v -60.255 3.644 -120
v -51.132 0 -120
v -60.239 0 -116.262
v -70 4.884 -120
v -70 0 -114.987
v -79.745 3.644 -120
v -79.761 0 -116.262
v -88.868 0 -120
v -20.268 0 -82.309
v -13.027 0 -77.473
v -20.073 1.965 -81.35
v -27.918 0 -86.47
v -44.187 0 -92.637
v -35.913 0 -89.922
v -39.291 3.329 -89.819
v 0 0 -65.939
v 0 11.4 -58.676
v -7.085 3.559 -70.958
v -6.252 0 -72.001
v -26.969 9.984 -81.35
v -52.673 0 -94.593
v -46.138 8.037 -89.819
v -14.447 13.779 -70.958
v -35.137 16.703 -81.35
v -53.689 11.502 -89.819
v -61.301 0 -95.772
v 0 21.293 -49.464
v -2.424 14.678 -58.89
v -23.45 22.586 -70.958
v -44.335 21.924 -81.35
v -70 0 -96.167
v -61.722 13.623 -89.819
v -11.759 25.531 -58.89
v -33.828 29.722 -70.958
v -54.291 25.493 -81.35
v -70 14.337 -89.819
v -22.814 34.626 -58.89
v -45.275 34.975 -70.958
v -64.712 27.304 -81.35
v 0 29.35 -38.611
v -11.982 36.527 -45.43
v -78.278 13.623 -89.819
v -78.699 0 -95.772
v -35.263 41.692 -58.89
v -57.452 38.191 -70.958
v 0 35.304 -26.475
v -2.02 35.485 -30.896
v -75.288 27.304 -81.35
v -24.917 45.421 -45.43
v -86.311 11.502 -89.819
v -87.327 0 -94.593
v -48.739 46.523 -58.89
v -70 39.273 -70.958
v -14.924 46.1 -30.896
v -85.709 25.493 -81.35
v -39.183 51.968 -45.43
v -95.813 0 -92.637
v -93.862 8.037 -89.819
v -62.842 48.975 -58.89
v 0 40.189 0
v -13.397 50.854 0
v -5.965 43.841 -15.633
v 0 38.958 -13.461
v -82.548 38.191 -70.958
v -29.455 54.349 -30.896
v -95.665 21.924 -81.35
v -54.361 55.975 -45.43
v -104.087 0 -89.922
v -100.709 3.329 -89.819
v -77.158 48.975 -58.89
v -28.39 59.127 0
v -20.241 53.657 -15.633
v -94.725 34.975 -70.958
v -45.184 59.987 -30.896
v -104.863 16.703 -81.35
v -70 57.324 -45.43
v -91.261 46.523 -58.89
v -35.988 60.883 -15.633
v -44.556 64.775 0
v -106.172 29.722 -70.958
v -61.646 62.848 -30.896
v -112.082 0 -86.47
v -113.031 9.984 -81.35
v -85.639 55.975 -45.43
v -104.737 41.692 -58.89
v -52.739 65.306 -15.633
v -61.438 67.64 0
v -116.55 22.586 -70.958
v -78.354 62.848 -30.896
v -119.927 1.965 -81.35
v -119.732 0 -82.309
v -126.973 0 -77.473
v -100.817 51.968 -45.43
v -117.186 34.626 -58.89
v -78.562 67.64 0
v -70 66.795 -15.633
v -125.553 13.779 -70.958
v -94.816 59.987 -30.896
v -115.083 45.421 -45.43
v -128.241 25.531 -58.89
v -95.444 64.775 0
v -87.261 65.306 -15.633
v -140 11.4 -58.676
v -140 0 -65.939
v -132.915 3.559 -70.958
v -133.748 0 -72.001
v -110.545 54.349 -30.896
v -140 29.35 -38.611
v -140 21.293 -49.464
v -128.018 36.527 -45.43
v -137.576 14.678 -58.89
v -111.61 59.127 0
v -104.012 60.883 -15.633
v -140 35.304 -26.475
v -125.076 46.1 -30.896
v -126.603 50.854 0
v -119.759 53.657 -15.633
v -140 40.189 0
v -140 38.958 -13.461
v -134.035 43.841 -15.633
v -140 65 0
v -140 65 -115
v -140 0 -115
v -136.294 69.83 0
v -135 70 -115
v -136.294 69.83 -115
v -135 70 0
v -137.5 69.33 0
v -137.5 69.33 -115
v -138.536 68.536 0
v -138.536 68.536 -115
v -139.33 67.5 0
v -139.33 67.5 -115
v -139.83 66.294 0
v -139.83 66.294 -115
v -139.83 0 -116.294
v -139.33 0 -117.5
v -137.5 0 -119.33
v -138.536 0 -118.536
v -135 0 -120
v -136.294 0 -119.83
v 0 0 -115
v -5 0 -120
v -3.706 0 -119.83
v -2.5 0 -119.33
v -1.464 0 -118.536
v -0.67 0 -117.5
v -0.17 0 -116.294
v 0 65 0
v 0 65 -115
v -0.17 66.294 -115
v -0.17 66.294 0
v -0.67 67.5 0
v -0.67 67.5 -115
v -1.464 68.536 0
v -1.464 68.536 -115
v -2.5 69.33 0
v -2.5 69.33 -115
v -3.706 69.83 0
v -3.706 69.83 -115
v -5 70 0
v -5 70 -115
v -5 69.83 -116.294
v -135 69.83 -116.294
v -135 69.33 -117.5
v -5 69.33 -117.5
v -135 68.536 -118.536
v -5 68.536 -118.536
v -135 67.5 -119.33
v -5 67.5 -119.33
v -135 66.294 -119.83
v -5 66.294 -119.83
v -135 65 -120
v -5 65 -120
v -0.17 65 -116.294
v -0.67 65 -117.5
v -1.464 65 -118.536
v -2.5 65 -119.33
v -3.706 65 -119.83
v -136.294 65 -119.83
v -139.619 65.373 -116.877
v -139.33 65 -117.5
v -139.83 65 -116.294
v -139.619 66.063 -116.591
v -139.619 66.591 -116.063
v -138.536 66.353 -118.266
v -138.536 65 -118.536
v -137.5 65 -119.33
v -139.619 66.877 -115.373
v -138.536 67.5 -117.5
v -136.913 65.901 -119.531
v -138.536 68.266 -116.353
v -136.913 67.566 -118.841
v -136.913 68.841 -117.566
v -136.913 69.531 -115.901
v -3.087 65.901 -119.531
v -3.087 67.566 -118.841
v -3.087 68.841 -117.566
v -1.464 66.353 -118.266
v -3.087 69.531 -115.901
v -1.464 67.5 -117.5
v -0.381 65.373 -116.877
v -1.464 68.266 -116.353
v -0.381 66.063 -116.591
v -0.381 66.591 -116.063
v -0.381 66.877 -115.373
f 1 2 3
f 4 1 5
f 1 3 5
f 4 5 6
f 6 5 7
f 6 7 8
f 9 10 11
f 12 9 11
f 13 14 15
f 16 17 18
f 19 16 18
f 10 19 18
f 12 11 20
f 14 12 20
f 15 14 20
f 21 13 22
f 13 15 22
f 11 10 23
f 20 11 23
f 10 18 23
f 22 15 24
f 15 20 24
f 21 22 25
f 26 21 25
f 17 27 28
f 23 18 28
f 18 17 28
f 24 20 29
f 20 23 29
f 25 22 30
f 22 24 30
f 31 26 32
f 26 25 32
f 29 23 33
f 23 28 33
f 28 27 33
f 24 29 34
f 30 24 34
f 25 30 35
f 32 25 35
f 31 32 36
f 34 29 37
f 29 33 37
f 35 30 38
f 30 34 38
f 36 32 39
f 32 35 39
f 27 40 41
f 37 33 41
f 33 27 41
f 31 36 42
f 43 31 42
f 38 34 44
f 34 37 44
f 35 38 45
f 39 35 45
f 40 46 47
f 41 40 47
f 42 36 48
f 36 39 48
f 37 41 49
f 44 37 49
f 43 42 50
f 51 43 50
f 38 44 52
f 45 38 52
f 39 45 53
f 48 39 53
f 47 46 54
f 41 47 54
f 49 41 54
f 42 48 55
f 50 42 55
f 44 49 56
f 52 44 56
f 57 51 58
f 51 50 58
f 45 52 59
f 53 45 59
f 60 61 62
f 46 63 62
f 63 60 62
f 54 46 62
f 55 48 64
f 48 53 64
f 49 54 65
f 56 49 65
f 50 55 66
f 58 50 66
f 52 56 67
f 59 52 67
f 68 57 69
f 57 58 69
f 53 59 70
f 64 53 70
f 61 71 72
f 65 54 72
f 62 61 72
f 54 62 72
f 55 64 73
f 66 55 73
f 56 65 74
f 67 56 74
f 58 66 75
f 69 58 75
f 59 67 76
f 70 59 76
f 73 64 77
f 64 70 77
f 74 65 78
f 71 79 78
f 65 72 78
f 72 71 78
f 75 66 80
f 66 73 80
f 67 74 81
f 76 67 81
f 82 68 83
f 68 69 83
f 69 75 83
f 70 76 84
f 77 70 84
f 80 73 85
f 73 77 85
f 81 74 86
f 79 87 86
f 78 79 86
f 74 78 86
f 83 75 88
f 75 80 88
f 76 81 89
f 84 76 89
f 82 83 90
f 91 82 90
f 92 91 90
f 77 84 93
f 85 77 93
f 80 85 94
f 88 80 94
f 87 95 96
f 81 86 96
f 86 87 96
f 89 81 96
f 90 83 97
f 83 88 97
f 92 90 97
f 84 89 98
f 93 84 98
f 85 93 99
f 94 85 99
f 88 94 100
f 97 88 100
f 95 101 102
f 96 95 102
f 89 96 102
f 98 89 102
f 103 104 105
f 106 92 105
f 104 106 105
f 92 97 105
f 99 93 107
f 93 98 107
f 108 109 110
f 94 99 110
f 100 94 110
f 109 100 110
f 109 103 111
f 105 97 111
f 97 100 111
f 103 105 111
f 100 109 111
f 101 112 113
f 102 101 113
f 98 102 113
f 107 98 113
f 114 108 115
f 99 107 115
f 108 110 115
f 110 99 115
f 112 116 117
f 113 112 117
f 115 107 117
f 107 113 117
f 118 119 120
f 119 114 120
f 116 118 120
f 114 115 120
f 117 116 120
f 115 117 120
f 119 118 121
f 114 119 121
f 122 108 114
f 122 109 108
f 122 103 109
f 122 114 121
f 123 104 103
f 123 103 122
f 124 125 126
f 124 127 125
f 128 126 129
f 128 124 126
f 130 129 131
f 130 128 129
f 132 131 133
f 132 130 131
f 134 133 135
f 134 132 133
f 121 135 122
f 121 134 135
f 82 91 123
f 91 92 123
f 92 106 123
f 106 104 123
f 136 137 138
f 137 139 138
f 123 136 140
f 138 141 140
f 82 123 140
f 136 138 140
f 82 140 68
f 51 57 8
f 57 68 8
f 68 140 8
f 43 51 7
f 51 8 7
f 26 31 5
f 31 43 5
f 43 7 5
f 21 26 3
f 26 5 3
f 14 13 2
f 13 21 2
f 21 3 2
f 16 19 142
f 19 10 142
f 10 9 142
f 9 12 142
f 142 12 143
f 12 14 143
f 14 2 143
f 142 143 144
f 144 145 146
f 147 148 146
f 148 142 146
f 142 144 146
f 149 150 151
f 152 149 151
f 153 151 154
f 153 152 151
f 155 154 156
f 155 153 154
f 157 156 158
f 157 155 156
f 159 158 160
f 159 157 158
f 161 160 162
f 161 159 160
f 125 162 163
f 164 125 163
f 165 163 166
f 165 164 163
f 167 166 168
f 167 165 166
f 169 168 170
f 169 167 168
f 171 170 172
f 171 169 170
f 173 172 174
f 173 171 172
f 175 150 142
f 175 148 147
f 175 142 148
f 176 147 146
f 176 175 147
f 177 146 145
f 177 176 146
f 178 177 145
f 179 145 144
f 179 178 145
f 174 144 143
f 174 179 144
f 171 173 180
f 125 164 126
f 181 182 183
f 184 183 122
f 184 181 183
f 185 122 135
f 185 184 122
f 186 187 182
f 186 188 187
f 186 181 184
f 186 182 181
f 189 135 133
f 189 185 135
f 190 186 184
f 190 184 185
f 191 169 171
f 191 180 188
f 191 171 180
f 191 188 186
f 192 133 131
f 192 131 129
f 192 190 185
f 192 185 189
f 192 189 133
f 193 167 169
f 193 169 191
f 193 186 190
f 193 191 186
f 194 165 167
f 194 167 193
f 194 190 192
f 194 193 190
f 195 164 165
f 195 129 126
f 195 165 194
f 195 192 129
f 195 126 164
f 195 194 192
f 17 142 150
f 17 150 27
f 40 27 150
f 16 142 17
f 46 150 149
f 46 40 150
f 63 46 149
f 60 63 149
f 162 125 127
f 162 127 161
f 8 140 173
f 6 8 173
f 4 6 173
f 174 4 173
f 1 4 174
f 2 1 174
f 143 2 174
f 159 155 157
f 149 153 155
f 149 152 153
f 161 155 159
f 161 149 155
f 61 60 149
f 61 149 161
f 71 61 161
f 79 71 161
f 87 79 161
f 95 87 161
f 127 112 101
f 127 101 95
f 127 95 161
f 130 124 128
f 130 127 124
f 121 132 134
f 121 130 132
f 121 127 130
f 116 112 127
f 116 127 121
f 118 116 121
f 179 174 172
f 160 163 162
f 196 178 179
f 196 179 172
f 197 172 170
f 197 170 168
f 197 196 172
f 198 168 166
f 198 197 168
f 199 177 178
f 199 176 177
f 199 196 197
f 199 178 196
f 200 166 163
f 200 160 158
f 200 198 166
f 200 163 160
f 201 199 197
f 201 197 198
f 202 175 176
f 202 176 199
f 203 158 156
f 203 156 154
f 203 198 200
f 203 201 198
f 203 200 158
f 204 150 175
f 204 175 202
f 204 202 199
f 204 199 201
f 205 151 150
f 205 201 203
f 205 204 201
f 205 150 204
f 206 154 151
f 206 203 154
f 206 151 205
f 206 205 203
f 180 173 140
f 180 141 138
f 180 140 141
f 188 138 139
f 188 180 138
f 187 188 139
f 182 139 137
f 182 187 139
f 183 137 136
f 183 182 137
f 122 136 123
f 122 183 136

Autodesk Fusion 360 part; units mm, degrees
sketch "Sketch15" plane through (0, 0, 0) normal (0, 1, 0) x (1, 0, 0)
  line L0 (0, 0) -> (-140, 0)
  line L1 (-140, 0) -> (-140, 120)
  line L2 (-140, 120) -> (0, 120)
  line L3 (0, 120) -> (0, 0)
  line L4 (0, 0) -> (-70, 0) construction
  line L5 (-70, 0) -> (-70, 102) construction
  line L6 (-70, 102) -> (-70, 153) construction
  line L7 (-70, 120) -> (-70, 0)
  arc A0 (-108.8844, 120) -> (-70, 102) centre (-70, 153) ccw
  arc A1 (-70, 102) -> (-140, 74.1889) centre (-70, 0) ccw
  dimension "d65" = 140
  dimension "d66" = 120
  dimension "d67" = 70
  dimension "d68" = 102
  dimension "d69" = 204
  dimension "d70" = 51
  dimension "d71" = 102
extrude "Extrude9" add sketch "Sketch15" along normal blind 70
ref_plane "WorkPlane3" through (-70, -34, -60) normal (0, 1, 0) x (0, 0, 1)
sketch "Sketch16" plane through (0, -34, 0) normal (0, 1, 0) x (1, 0, 0)
  line L0 (0, 0) -> (-70, 0) construction
  line L1 (-70, 0) -> (-70, 153) construction
  line L2 (-70, 0) -> (-70, 204)
  line L3 (-70, 0) -> (-172, 0)
  arc A0 (-70, 102) -> (-172, 0) centre (-70, 0) ccw
  arc A1 (-70, 204) -> (-70, 102) centre (-70, 153) ccw
  dimension "d75" = 70
  dimension "d76" = 153
  dimension "d77" = 204
  dimension "d78" = 102
revolve "Revolve6" cut sketch "Sketch16" angle 360 about axis through (-70, -34, 0) along (0, 0, -1)
fillet "Fillet1" radius 5 1 edges at (-70, 70, -120)
fillet "Fillet2" radius 5 3 edges at (-140, 32.5, -120) (-140, 68.5355, -118.5355) (-140, 70, -57.5)
fillet "Fillet3" radius 5 3 edges at (0, 32.5, -120) (0, 68.5355, -118.5355) (0, 70, -57.5)
